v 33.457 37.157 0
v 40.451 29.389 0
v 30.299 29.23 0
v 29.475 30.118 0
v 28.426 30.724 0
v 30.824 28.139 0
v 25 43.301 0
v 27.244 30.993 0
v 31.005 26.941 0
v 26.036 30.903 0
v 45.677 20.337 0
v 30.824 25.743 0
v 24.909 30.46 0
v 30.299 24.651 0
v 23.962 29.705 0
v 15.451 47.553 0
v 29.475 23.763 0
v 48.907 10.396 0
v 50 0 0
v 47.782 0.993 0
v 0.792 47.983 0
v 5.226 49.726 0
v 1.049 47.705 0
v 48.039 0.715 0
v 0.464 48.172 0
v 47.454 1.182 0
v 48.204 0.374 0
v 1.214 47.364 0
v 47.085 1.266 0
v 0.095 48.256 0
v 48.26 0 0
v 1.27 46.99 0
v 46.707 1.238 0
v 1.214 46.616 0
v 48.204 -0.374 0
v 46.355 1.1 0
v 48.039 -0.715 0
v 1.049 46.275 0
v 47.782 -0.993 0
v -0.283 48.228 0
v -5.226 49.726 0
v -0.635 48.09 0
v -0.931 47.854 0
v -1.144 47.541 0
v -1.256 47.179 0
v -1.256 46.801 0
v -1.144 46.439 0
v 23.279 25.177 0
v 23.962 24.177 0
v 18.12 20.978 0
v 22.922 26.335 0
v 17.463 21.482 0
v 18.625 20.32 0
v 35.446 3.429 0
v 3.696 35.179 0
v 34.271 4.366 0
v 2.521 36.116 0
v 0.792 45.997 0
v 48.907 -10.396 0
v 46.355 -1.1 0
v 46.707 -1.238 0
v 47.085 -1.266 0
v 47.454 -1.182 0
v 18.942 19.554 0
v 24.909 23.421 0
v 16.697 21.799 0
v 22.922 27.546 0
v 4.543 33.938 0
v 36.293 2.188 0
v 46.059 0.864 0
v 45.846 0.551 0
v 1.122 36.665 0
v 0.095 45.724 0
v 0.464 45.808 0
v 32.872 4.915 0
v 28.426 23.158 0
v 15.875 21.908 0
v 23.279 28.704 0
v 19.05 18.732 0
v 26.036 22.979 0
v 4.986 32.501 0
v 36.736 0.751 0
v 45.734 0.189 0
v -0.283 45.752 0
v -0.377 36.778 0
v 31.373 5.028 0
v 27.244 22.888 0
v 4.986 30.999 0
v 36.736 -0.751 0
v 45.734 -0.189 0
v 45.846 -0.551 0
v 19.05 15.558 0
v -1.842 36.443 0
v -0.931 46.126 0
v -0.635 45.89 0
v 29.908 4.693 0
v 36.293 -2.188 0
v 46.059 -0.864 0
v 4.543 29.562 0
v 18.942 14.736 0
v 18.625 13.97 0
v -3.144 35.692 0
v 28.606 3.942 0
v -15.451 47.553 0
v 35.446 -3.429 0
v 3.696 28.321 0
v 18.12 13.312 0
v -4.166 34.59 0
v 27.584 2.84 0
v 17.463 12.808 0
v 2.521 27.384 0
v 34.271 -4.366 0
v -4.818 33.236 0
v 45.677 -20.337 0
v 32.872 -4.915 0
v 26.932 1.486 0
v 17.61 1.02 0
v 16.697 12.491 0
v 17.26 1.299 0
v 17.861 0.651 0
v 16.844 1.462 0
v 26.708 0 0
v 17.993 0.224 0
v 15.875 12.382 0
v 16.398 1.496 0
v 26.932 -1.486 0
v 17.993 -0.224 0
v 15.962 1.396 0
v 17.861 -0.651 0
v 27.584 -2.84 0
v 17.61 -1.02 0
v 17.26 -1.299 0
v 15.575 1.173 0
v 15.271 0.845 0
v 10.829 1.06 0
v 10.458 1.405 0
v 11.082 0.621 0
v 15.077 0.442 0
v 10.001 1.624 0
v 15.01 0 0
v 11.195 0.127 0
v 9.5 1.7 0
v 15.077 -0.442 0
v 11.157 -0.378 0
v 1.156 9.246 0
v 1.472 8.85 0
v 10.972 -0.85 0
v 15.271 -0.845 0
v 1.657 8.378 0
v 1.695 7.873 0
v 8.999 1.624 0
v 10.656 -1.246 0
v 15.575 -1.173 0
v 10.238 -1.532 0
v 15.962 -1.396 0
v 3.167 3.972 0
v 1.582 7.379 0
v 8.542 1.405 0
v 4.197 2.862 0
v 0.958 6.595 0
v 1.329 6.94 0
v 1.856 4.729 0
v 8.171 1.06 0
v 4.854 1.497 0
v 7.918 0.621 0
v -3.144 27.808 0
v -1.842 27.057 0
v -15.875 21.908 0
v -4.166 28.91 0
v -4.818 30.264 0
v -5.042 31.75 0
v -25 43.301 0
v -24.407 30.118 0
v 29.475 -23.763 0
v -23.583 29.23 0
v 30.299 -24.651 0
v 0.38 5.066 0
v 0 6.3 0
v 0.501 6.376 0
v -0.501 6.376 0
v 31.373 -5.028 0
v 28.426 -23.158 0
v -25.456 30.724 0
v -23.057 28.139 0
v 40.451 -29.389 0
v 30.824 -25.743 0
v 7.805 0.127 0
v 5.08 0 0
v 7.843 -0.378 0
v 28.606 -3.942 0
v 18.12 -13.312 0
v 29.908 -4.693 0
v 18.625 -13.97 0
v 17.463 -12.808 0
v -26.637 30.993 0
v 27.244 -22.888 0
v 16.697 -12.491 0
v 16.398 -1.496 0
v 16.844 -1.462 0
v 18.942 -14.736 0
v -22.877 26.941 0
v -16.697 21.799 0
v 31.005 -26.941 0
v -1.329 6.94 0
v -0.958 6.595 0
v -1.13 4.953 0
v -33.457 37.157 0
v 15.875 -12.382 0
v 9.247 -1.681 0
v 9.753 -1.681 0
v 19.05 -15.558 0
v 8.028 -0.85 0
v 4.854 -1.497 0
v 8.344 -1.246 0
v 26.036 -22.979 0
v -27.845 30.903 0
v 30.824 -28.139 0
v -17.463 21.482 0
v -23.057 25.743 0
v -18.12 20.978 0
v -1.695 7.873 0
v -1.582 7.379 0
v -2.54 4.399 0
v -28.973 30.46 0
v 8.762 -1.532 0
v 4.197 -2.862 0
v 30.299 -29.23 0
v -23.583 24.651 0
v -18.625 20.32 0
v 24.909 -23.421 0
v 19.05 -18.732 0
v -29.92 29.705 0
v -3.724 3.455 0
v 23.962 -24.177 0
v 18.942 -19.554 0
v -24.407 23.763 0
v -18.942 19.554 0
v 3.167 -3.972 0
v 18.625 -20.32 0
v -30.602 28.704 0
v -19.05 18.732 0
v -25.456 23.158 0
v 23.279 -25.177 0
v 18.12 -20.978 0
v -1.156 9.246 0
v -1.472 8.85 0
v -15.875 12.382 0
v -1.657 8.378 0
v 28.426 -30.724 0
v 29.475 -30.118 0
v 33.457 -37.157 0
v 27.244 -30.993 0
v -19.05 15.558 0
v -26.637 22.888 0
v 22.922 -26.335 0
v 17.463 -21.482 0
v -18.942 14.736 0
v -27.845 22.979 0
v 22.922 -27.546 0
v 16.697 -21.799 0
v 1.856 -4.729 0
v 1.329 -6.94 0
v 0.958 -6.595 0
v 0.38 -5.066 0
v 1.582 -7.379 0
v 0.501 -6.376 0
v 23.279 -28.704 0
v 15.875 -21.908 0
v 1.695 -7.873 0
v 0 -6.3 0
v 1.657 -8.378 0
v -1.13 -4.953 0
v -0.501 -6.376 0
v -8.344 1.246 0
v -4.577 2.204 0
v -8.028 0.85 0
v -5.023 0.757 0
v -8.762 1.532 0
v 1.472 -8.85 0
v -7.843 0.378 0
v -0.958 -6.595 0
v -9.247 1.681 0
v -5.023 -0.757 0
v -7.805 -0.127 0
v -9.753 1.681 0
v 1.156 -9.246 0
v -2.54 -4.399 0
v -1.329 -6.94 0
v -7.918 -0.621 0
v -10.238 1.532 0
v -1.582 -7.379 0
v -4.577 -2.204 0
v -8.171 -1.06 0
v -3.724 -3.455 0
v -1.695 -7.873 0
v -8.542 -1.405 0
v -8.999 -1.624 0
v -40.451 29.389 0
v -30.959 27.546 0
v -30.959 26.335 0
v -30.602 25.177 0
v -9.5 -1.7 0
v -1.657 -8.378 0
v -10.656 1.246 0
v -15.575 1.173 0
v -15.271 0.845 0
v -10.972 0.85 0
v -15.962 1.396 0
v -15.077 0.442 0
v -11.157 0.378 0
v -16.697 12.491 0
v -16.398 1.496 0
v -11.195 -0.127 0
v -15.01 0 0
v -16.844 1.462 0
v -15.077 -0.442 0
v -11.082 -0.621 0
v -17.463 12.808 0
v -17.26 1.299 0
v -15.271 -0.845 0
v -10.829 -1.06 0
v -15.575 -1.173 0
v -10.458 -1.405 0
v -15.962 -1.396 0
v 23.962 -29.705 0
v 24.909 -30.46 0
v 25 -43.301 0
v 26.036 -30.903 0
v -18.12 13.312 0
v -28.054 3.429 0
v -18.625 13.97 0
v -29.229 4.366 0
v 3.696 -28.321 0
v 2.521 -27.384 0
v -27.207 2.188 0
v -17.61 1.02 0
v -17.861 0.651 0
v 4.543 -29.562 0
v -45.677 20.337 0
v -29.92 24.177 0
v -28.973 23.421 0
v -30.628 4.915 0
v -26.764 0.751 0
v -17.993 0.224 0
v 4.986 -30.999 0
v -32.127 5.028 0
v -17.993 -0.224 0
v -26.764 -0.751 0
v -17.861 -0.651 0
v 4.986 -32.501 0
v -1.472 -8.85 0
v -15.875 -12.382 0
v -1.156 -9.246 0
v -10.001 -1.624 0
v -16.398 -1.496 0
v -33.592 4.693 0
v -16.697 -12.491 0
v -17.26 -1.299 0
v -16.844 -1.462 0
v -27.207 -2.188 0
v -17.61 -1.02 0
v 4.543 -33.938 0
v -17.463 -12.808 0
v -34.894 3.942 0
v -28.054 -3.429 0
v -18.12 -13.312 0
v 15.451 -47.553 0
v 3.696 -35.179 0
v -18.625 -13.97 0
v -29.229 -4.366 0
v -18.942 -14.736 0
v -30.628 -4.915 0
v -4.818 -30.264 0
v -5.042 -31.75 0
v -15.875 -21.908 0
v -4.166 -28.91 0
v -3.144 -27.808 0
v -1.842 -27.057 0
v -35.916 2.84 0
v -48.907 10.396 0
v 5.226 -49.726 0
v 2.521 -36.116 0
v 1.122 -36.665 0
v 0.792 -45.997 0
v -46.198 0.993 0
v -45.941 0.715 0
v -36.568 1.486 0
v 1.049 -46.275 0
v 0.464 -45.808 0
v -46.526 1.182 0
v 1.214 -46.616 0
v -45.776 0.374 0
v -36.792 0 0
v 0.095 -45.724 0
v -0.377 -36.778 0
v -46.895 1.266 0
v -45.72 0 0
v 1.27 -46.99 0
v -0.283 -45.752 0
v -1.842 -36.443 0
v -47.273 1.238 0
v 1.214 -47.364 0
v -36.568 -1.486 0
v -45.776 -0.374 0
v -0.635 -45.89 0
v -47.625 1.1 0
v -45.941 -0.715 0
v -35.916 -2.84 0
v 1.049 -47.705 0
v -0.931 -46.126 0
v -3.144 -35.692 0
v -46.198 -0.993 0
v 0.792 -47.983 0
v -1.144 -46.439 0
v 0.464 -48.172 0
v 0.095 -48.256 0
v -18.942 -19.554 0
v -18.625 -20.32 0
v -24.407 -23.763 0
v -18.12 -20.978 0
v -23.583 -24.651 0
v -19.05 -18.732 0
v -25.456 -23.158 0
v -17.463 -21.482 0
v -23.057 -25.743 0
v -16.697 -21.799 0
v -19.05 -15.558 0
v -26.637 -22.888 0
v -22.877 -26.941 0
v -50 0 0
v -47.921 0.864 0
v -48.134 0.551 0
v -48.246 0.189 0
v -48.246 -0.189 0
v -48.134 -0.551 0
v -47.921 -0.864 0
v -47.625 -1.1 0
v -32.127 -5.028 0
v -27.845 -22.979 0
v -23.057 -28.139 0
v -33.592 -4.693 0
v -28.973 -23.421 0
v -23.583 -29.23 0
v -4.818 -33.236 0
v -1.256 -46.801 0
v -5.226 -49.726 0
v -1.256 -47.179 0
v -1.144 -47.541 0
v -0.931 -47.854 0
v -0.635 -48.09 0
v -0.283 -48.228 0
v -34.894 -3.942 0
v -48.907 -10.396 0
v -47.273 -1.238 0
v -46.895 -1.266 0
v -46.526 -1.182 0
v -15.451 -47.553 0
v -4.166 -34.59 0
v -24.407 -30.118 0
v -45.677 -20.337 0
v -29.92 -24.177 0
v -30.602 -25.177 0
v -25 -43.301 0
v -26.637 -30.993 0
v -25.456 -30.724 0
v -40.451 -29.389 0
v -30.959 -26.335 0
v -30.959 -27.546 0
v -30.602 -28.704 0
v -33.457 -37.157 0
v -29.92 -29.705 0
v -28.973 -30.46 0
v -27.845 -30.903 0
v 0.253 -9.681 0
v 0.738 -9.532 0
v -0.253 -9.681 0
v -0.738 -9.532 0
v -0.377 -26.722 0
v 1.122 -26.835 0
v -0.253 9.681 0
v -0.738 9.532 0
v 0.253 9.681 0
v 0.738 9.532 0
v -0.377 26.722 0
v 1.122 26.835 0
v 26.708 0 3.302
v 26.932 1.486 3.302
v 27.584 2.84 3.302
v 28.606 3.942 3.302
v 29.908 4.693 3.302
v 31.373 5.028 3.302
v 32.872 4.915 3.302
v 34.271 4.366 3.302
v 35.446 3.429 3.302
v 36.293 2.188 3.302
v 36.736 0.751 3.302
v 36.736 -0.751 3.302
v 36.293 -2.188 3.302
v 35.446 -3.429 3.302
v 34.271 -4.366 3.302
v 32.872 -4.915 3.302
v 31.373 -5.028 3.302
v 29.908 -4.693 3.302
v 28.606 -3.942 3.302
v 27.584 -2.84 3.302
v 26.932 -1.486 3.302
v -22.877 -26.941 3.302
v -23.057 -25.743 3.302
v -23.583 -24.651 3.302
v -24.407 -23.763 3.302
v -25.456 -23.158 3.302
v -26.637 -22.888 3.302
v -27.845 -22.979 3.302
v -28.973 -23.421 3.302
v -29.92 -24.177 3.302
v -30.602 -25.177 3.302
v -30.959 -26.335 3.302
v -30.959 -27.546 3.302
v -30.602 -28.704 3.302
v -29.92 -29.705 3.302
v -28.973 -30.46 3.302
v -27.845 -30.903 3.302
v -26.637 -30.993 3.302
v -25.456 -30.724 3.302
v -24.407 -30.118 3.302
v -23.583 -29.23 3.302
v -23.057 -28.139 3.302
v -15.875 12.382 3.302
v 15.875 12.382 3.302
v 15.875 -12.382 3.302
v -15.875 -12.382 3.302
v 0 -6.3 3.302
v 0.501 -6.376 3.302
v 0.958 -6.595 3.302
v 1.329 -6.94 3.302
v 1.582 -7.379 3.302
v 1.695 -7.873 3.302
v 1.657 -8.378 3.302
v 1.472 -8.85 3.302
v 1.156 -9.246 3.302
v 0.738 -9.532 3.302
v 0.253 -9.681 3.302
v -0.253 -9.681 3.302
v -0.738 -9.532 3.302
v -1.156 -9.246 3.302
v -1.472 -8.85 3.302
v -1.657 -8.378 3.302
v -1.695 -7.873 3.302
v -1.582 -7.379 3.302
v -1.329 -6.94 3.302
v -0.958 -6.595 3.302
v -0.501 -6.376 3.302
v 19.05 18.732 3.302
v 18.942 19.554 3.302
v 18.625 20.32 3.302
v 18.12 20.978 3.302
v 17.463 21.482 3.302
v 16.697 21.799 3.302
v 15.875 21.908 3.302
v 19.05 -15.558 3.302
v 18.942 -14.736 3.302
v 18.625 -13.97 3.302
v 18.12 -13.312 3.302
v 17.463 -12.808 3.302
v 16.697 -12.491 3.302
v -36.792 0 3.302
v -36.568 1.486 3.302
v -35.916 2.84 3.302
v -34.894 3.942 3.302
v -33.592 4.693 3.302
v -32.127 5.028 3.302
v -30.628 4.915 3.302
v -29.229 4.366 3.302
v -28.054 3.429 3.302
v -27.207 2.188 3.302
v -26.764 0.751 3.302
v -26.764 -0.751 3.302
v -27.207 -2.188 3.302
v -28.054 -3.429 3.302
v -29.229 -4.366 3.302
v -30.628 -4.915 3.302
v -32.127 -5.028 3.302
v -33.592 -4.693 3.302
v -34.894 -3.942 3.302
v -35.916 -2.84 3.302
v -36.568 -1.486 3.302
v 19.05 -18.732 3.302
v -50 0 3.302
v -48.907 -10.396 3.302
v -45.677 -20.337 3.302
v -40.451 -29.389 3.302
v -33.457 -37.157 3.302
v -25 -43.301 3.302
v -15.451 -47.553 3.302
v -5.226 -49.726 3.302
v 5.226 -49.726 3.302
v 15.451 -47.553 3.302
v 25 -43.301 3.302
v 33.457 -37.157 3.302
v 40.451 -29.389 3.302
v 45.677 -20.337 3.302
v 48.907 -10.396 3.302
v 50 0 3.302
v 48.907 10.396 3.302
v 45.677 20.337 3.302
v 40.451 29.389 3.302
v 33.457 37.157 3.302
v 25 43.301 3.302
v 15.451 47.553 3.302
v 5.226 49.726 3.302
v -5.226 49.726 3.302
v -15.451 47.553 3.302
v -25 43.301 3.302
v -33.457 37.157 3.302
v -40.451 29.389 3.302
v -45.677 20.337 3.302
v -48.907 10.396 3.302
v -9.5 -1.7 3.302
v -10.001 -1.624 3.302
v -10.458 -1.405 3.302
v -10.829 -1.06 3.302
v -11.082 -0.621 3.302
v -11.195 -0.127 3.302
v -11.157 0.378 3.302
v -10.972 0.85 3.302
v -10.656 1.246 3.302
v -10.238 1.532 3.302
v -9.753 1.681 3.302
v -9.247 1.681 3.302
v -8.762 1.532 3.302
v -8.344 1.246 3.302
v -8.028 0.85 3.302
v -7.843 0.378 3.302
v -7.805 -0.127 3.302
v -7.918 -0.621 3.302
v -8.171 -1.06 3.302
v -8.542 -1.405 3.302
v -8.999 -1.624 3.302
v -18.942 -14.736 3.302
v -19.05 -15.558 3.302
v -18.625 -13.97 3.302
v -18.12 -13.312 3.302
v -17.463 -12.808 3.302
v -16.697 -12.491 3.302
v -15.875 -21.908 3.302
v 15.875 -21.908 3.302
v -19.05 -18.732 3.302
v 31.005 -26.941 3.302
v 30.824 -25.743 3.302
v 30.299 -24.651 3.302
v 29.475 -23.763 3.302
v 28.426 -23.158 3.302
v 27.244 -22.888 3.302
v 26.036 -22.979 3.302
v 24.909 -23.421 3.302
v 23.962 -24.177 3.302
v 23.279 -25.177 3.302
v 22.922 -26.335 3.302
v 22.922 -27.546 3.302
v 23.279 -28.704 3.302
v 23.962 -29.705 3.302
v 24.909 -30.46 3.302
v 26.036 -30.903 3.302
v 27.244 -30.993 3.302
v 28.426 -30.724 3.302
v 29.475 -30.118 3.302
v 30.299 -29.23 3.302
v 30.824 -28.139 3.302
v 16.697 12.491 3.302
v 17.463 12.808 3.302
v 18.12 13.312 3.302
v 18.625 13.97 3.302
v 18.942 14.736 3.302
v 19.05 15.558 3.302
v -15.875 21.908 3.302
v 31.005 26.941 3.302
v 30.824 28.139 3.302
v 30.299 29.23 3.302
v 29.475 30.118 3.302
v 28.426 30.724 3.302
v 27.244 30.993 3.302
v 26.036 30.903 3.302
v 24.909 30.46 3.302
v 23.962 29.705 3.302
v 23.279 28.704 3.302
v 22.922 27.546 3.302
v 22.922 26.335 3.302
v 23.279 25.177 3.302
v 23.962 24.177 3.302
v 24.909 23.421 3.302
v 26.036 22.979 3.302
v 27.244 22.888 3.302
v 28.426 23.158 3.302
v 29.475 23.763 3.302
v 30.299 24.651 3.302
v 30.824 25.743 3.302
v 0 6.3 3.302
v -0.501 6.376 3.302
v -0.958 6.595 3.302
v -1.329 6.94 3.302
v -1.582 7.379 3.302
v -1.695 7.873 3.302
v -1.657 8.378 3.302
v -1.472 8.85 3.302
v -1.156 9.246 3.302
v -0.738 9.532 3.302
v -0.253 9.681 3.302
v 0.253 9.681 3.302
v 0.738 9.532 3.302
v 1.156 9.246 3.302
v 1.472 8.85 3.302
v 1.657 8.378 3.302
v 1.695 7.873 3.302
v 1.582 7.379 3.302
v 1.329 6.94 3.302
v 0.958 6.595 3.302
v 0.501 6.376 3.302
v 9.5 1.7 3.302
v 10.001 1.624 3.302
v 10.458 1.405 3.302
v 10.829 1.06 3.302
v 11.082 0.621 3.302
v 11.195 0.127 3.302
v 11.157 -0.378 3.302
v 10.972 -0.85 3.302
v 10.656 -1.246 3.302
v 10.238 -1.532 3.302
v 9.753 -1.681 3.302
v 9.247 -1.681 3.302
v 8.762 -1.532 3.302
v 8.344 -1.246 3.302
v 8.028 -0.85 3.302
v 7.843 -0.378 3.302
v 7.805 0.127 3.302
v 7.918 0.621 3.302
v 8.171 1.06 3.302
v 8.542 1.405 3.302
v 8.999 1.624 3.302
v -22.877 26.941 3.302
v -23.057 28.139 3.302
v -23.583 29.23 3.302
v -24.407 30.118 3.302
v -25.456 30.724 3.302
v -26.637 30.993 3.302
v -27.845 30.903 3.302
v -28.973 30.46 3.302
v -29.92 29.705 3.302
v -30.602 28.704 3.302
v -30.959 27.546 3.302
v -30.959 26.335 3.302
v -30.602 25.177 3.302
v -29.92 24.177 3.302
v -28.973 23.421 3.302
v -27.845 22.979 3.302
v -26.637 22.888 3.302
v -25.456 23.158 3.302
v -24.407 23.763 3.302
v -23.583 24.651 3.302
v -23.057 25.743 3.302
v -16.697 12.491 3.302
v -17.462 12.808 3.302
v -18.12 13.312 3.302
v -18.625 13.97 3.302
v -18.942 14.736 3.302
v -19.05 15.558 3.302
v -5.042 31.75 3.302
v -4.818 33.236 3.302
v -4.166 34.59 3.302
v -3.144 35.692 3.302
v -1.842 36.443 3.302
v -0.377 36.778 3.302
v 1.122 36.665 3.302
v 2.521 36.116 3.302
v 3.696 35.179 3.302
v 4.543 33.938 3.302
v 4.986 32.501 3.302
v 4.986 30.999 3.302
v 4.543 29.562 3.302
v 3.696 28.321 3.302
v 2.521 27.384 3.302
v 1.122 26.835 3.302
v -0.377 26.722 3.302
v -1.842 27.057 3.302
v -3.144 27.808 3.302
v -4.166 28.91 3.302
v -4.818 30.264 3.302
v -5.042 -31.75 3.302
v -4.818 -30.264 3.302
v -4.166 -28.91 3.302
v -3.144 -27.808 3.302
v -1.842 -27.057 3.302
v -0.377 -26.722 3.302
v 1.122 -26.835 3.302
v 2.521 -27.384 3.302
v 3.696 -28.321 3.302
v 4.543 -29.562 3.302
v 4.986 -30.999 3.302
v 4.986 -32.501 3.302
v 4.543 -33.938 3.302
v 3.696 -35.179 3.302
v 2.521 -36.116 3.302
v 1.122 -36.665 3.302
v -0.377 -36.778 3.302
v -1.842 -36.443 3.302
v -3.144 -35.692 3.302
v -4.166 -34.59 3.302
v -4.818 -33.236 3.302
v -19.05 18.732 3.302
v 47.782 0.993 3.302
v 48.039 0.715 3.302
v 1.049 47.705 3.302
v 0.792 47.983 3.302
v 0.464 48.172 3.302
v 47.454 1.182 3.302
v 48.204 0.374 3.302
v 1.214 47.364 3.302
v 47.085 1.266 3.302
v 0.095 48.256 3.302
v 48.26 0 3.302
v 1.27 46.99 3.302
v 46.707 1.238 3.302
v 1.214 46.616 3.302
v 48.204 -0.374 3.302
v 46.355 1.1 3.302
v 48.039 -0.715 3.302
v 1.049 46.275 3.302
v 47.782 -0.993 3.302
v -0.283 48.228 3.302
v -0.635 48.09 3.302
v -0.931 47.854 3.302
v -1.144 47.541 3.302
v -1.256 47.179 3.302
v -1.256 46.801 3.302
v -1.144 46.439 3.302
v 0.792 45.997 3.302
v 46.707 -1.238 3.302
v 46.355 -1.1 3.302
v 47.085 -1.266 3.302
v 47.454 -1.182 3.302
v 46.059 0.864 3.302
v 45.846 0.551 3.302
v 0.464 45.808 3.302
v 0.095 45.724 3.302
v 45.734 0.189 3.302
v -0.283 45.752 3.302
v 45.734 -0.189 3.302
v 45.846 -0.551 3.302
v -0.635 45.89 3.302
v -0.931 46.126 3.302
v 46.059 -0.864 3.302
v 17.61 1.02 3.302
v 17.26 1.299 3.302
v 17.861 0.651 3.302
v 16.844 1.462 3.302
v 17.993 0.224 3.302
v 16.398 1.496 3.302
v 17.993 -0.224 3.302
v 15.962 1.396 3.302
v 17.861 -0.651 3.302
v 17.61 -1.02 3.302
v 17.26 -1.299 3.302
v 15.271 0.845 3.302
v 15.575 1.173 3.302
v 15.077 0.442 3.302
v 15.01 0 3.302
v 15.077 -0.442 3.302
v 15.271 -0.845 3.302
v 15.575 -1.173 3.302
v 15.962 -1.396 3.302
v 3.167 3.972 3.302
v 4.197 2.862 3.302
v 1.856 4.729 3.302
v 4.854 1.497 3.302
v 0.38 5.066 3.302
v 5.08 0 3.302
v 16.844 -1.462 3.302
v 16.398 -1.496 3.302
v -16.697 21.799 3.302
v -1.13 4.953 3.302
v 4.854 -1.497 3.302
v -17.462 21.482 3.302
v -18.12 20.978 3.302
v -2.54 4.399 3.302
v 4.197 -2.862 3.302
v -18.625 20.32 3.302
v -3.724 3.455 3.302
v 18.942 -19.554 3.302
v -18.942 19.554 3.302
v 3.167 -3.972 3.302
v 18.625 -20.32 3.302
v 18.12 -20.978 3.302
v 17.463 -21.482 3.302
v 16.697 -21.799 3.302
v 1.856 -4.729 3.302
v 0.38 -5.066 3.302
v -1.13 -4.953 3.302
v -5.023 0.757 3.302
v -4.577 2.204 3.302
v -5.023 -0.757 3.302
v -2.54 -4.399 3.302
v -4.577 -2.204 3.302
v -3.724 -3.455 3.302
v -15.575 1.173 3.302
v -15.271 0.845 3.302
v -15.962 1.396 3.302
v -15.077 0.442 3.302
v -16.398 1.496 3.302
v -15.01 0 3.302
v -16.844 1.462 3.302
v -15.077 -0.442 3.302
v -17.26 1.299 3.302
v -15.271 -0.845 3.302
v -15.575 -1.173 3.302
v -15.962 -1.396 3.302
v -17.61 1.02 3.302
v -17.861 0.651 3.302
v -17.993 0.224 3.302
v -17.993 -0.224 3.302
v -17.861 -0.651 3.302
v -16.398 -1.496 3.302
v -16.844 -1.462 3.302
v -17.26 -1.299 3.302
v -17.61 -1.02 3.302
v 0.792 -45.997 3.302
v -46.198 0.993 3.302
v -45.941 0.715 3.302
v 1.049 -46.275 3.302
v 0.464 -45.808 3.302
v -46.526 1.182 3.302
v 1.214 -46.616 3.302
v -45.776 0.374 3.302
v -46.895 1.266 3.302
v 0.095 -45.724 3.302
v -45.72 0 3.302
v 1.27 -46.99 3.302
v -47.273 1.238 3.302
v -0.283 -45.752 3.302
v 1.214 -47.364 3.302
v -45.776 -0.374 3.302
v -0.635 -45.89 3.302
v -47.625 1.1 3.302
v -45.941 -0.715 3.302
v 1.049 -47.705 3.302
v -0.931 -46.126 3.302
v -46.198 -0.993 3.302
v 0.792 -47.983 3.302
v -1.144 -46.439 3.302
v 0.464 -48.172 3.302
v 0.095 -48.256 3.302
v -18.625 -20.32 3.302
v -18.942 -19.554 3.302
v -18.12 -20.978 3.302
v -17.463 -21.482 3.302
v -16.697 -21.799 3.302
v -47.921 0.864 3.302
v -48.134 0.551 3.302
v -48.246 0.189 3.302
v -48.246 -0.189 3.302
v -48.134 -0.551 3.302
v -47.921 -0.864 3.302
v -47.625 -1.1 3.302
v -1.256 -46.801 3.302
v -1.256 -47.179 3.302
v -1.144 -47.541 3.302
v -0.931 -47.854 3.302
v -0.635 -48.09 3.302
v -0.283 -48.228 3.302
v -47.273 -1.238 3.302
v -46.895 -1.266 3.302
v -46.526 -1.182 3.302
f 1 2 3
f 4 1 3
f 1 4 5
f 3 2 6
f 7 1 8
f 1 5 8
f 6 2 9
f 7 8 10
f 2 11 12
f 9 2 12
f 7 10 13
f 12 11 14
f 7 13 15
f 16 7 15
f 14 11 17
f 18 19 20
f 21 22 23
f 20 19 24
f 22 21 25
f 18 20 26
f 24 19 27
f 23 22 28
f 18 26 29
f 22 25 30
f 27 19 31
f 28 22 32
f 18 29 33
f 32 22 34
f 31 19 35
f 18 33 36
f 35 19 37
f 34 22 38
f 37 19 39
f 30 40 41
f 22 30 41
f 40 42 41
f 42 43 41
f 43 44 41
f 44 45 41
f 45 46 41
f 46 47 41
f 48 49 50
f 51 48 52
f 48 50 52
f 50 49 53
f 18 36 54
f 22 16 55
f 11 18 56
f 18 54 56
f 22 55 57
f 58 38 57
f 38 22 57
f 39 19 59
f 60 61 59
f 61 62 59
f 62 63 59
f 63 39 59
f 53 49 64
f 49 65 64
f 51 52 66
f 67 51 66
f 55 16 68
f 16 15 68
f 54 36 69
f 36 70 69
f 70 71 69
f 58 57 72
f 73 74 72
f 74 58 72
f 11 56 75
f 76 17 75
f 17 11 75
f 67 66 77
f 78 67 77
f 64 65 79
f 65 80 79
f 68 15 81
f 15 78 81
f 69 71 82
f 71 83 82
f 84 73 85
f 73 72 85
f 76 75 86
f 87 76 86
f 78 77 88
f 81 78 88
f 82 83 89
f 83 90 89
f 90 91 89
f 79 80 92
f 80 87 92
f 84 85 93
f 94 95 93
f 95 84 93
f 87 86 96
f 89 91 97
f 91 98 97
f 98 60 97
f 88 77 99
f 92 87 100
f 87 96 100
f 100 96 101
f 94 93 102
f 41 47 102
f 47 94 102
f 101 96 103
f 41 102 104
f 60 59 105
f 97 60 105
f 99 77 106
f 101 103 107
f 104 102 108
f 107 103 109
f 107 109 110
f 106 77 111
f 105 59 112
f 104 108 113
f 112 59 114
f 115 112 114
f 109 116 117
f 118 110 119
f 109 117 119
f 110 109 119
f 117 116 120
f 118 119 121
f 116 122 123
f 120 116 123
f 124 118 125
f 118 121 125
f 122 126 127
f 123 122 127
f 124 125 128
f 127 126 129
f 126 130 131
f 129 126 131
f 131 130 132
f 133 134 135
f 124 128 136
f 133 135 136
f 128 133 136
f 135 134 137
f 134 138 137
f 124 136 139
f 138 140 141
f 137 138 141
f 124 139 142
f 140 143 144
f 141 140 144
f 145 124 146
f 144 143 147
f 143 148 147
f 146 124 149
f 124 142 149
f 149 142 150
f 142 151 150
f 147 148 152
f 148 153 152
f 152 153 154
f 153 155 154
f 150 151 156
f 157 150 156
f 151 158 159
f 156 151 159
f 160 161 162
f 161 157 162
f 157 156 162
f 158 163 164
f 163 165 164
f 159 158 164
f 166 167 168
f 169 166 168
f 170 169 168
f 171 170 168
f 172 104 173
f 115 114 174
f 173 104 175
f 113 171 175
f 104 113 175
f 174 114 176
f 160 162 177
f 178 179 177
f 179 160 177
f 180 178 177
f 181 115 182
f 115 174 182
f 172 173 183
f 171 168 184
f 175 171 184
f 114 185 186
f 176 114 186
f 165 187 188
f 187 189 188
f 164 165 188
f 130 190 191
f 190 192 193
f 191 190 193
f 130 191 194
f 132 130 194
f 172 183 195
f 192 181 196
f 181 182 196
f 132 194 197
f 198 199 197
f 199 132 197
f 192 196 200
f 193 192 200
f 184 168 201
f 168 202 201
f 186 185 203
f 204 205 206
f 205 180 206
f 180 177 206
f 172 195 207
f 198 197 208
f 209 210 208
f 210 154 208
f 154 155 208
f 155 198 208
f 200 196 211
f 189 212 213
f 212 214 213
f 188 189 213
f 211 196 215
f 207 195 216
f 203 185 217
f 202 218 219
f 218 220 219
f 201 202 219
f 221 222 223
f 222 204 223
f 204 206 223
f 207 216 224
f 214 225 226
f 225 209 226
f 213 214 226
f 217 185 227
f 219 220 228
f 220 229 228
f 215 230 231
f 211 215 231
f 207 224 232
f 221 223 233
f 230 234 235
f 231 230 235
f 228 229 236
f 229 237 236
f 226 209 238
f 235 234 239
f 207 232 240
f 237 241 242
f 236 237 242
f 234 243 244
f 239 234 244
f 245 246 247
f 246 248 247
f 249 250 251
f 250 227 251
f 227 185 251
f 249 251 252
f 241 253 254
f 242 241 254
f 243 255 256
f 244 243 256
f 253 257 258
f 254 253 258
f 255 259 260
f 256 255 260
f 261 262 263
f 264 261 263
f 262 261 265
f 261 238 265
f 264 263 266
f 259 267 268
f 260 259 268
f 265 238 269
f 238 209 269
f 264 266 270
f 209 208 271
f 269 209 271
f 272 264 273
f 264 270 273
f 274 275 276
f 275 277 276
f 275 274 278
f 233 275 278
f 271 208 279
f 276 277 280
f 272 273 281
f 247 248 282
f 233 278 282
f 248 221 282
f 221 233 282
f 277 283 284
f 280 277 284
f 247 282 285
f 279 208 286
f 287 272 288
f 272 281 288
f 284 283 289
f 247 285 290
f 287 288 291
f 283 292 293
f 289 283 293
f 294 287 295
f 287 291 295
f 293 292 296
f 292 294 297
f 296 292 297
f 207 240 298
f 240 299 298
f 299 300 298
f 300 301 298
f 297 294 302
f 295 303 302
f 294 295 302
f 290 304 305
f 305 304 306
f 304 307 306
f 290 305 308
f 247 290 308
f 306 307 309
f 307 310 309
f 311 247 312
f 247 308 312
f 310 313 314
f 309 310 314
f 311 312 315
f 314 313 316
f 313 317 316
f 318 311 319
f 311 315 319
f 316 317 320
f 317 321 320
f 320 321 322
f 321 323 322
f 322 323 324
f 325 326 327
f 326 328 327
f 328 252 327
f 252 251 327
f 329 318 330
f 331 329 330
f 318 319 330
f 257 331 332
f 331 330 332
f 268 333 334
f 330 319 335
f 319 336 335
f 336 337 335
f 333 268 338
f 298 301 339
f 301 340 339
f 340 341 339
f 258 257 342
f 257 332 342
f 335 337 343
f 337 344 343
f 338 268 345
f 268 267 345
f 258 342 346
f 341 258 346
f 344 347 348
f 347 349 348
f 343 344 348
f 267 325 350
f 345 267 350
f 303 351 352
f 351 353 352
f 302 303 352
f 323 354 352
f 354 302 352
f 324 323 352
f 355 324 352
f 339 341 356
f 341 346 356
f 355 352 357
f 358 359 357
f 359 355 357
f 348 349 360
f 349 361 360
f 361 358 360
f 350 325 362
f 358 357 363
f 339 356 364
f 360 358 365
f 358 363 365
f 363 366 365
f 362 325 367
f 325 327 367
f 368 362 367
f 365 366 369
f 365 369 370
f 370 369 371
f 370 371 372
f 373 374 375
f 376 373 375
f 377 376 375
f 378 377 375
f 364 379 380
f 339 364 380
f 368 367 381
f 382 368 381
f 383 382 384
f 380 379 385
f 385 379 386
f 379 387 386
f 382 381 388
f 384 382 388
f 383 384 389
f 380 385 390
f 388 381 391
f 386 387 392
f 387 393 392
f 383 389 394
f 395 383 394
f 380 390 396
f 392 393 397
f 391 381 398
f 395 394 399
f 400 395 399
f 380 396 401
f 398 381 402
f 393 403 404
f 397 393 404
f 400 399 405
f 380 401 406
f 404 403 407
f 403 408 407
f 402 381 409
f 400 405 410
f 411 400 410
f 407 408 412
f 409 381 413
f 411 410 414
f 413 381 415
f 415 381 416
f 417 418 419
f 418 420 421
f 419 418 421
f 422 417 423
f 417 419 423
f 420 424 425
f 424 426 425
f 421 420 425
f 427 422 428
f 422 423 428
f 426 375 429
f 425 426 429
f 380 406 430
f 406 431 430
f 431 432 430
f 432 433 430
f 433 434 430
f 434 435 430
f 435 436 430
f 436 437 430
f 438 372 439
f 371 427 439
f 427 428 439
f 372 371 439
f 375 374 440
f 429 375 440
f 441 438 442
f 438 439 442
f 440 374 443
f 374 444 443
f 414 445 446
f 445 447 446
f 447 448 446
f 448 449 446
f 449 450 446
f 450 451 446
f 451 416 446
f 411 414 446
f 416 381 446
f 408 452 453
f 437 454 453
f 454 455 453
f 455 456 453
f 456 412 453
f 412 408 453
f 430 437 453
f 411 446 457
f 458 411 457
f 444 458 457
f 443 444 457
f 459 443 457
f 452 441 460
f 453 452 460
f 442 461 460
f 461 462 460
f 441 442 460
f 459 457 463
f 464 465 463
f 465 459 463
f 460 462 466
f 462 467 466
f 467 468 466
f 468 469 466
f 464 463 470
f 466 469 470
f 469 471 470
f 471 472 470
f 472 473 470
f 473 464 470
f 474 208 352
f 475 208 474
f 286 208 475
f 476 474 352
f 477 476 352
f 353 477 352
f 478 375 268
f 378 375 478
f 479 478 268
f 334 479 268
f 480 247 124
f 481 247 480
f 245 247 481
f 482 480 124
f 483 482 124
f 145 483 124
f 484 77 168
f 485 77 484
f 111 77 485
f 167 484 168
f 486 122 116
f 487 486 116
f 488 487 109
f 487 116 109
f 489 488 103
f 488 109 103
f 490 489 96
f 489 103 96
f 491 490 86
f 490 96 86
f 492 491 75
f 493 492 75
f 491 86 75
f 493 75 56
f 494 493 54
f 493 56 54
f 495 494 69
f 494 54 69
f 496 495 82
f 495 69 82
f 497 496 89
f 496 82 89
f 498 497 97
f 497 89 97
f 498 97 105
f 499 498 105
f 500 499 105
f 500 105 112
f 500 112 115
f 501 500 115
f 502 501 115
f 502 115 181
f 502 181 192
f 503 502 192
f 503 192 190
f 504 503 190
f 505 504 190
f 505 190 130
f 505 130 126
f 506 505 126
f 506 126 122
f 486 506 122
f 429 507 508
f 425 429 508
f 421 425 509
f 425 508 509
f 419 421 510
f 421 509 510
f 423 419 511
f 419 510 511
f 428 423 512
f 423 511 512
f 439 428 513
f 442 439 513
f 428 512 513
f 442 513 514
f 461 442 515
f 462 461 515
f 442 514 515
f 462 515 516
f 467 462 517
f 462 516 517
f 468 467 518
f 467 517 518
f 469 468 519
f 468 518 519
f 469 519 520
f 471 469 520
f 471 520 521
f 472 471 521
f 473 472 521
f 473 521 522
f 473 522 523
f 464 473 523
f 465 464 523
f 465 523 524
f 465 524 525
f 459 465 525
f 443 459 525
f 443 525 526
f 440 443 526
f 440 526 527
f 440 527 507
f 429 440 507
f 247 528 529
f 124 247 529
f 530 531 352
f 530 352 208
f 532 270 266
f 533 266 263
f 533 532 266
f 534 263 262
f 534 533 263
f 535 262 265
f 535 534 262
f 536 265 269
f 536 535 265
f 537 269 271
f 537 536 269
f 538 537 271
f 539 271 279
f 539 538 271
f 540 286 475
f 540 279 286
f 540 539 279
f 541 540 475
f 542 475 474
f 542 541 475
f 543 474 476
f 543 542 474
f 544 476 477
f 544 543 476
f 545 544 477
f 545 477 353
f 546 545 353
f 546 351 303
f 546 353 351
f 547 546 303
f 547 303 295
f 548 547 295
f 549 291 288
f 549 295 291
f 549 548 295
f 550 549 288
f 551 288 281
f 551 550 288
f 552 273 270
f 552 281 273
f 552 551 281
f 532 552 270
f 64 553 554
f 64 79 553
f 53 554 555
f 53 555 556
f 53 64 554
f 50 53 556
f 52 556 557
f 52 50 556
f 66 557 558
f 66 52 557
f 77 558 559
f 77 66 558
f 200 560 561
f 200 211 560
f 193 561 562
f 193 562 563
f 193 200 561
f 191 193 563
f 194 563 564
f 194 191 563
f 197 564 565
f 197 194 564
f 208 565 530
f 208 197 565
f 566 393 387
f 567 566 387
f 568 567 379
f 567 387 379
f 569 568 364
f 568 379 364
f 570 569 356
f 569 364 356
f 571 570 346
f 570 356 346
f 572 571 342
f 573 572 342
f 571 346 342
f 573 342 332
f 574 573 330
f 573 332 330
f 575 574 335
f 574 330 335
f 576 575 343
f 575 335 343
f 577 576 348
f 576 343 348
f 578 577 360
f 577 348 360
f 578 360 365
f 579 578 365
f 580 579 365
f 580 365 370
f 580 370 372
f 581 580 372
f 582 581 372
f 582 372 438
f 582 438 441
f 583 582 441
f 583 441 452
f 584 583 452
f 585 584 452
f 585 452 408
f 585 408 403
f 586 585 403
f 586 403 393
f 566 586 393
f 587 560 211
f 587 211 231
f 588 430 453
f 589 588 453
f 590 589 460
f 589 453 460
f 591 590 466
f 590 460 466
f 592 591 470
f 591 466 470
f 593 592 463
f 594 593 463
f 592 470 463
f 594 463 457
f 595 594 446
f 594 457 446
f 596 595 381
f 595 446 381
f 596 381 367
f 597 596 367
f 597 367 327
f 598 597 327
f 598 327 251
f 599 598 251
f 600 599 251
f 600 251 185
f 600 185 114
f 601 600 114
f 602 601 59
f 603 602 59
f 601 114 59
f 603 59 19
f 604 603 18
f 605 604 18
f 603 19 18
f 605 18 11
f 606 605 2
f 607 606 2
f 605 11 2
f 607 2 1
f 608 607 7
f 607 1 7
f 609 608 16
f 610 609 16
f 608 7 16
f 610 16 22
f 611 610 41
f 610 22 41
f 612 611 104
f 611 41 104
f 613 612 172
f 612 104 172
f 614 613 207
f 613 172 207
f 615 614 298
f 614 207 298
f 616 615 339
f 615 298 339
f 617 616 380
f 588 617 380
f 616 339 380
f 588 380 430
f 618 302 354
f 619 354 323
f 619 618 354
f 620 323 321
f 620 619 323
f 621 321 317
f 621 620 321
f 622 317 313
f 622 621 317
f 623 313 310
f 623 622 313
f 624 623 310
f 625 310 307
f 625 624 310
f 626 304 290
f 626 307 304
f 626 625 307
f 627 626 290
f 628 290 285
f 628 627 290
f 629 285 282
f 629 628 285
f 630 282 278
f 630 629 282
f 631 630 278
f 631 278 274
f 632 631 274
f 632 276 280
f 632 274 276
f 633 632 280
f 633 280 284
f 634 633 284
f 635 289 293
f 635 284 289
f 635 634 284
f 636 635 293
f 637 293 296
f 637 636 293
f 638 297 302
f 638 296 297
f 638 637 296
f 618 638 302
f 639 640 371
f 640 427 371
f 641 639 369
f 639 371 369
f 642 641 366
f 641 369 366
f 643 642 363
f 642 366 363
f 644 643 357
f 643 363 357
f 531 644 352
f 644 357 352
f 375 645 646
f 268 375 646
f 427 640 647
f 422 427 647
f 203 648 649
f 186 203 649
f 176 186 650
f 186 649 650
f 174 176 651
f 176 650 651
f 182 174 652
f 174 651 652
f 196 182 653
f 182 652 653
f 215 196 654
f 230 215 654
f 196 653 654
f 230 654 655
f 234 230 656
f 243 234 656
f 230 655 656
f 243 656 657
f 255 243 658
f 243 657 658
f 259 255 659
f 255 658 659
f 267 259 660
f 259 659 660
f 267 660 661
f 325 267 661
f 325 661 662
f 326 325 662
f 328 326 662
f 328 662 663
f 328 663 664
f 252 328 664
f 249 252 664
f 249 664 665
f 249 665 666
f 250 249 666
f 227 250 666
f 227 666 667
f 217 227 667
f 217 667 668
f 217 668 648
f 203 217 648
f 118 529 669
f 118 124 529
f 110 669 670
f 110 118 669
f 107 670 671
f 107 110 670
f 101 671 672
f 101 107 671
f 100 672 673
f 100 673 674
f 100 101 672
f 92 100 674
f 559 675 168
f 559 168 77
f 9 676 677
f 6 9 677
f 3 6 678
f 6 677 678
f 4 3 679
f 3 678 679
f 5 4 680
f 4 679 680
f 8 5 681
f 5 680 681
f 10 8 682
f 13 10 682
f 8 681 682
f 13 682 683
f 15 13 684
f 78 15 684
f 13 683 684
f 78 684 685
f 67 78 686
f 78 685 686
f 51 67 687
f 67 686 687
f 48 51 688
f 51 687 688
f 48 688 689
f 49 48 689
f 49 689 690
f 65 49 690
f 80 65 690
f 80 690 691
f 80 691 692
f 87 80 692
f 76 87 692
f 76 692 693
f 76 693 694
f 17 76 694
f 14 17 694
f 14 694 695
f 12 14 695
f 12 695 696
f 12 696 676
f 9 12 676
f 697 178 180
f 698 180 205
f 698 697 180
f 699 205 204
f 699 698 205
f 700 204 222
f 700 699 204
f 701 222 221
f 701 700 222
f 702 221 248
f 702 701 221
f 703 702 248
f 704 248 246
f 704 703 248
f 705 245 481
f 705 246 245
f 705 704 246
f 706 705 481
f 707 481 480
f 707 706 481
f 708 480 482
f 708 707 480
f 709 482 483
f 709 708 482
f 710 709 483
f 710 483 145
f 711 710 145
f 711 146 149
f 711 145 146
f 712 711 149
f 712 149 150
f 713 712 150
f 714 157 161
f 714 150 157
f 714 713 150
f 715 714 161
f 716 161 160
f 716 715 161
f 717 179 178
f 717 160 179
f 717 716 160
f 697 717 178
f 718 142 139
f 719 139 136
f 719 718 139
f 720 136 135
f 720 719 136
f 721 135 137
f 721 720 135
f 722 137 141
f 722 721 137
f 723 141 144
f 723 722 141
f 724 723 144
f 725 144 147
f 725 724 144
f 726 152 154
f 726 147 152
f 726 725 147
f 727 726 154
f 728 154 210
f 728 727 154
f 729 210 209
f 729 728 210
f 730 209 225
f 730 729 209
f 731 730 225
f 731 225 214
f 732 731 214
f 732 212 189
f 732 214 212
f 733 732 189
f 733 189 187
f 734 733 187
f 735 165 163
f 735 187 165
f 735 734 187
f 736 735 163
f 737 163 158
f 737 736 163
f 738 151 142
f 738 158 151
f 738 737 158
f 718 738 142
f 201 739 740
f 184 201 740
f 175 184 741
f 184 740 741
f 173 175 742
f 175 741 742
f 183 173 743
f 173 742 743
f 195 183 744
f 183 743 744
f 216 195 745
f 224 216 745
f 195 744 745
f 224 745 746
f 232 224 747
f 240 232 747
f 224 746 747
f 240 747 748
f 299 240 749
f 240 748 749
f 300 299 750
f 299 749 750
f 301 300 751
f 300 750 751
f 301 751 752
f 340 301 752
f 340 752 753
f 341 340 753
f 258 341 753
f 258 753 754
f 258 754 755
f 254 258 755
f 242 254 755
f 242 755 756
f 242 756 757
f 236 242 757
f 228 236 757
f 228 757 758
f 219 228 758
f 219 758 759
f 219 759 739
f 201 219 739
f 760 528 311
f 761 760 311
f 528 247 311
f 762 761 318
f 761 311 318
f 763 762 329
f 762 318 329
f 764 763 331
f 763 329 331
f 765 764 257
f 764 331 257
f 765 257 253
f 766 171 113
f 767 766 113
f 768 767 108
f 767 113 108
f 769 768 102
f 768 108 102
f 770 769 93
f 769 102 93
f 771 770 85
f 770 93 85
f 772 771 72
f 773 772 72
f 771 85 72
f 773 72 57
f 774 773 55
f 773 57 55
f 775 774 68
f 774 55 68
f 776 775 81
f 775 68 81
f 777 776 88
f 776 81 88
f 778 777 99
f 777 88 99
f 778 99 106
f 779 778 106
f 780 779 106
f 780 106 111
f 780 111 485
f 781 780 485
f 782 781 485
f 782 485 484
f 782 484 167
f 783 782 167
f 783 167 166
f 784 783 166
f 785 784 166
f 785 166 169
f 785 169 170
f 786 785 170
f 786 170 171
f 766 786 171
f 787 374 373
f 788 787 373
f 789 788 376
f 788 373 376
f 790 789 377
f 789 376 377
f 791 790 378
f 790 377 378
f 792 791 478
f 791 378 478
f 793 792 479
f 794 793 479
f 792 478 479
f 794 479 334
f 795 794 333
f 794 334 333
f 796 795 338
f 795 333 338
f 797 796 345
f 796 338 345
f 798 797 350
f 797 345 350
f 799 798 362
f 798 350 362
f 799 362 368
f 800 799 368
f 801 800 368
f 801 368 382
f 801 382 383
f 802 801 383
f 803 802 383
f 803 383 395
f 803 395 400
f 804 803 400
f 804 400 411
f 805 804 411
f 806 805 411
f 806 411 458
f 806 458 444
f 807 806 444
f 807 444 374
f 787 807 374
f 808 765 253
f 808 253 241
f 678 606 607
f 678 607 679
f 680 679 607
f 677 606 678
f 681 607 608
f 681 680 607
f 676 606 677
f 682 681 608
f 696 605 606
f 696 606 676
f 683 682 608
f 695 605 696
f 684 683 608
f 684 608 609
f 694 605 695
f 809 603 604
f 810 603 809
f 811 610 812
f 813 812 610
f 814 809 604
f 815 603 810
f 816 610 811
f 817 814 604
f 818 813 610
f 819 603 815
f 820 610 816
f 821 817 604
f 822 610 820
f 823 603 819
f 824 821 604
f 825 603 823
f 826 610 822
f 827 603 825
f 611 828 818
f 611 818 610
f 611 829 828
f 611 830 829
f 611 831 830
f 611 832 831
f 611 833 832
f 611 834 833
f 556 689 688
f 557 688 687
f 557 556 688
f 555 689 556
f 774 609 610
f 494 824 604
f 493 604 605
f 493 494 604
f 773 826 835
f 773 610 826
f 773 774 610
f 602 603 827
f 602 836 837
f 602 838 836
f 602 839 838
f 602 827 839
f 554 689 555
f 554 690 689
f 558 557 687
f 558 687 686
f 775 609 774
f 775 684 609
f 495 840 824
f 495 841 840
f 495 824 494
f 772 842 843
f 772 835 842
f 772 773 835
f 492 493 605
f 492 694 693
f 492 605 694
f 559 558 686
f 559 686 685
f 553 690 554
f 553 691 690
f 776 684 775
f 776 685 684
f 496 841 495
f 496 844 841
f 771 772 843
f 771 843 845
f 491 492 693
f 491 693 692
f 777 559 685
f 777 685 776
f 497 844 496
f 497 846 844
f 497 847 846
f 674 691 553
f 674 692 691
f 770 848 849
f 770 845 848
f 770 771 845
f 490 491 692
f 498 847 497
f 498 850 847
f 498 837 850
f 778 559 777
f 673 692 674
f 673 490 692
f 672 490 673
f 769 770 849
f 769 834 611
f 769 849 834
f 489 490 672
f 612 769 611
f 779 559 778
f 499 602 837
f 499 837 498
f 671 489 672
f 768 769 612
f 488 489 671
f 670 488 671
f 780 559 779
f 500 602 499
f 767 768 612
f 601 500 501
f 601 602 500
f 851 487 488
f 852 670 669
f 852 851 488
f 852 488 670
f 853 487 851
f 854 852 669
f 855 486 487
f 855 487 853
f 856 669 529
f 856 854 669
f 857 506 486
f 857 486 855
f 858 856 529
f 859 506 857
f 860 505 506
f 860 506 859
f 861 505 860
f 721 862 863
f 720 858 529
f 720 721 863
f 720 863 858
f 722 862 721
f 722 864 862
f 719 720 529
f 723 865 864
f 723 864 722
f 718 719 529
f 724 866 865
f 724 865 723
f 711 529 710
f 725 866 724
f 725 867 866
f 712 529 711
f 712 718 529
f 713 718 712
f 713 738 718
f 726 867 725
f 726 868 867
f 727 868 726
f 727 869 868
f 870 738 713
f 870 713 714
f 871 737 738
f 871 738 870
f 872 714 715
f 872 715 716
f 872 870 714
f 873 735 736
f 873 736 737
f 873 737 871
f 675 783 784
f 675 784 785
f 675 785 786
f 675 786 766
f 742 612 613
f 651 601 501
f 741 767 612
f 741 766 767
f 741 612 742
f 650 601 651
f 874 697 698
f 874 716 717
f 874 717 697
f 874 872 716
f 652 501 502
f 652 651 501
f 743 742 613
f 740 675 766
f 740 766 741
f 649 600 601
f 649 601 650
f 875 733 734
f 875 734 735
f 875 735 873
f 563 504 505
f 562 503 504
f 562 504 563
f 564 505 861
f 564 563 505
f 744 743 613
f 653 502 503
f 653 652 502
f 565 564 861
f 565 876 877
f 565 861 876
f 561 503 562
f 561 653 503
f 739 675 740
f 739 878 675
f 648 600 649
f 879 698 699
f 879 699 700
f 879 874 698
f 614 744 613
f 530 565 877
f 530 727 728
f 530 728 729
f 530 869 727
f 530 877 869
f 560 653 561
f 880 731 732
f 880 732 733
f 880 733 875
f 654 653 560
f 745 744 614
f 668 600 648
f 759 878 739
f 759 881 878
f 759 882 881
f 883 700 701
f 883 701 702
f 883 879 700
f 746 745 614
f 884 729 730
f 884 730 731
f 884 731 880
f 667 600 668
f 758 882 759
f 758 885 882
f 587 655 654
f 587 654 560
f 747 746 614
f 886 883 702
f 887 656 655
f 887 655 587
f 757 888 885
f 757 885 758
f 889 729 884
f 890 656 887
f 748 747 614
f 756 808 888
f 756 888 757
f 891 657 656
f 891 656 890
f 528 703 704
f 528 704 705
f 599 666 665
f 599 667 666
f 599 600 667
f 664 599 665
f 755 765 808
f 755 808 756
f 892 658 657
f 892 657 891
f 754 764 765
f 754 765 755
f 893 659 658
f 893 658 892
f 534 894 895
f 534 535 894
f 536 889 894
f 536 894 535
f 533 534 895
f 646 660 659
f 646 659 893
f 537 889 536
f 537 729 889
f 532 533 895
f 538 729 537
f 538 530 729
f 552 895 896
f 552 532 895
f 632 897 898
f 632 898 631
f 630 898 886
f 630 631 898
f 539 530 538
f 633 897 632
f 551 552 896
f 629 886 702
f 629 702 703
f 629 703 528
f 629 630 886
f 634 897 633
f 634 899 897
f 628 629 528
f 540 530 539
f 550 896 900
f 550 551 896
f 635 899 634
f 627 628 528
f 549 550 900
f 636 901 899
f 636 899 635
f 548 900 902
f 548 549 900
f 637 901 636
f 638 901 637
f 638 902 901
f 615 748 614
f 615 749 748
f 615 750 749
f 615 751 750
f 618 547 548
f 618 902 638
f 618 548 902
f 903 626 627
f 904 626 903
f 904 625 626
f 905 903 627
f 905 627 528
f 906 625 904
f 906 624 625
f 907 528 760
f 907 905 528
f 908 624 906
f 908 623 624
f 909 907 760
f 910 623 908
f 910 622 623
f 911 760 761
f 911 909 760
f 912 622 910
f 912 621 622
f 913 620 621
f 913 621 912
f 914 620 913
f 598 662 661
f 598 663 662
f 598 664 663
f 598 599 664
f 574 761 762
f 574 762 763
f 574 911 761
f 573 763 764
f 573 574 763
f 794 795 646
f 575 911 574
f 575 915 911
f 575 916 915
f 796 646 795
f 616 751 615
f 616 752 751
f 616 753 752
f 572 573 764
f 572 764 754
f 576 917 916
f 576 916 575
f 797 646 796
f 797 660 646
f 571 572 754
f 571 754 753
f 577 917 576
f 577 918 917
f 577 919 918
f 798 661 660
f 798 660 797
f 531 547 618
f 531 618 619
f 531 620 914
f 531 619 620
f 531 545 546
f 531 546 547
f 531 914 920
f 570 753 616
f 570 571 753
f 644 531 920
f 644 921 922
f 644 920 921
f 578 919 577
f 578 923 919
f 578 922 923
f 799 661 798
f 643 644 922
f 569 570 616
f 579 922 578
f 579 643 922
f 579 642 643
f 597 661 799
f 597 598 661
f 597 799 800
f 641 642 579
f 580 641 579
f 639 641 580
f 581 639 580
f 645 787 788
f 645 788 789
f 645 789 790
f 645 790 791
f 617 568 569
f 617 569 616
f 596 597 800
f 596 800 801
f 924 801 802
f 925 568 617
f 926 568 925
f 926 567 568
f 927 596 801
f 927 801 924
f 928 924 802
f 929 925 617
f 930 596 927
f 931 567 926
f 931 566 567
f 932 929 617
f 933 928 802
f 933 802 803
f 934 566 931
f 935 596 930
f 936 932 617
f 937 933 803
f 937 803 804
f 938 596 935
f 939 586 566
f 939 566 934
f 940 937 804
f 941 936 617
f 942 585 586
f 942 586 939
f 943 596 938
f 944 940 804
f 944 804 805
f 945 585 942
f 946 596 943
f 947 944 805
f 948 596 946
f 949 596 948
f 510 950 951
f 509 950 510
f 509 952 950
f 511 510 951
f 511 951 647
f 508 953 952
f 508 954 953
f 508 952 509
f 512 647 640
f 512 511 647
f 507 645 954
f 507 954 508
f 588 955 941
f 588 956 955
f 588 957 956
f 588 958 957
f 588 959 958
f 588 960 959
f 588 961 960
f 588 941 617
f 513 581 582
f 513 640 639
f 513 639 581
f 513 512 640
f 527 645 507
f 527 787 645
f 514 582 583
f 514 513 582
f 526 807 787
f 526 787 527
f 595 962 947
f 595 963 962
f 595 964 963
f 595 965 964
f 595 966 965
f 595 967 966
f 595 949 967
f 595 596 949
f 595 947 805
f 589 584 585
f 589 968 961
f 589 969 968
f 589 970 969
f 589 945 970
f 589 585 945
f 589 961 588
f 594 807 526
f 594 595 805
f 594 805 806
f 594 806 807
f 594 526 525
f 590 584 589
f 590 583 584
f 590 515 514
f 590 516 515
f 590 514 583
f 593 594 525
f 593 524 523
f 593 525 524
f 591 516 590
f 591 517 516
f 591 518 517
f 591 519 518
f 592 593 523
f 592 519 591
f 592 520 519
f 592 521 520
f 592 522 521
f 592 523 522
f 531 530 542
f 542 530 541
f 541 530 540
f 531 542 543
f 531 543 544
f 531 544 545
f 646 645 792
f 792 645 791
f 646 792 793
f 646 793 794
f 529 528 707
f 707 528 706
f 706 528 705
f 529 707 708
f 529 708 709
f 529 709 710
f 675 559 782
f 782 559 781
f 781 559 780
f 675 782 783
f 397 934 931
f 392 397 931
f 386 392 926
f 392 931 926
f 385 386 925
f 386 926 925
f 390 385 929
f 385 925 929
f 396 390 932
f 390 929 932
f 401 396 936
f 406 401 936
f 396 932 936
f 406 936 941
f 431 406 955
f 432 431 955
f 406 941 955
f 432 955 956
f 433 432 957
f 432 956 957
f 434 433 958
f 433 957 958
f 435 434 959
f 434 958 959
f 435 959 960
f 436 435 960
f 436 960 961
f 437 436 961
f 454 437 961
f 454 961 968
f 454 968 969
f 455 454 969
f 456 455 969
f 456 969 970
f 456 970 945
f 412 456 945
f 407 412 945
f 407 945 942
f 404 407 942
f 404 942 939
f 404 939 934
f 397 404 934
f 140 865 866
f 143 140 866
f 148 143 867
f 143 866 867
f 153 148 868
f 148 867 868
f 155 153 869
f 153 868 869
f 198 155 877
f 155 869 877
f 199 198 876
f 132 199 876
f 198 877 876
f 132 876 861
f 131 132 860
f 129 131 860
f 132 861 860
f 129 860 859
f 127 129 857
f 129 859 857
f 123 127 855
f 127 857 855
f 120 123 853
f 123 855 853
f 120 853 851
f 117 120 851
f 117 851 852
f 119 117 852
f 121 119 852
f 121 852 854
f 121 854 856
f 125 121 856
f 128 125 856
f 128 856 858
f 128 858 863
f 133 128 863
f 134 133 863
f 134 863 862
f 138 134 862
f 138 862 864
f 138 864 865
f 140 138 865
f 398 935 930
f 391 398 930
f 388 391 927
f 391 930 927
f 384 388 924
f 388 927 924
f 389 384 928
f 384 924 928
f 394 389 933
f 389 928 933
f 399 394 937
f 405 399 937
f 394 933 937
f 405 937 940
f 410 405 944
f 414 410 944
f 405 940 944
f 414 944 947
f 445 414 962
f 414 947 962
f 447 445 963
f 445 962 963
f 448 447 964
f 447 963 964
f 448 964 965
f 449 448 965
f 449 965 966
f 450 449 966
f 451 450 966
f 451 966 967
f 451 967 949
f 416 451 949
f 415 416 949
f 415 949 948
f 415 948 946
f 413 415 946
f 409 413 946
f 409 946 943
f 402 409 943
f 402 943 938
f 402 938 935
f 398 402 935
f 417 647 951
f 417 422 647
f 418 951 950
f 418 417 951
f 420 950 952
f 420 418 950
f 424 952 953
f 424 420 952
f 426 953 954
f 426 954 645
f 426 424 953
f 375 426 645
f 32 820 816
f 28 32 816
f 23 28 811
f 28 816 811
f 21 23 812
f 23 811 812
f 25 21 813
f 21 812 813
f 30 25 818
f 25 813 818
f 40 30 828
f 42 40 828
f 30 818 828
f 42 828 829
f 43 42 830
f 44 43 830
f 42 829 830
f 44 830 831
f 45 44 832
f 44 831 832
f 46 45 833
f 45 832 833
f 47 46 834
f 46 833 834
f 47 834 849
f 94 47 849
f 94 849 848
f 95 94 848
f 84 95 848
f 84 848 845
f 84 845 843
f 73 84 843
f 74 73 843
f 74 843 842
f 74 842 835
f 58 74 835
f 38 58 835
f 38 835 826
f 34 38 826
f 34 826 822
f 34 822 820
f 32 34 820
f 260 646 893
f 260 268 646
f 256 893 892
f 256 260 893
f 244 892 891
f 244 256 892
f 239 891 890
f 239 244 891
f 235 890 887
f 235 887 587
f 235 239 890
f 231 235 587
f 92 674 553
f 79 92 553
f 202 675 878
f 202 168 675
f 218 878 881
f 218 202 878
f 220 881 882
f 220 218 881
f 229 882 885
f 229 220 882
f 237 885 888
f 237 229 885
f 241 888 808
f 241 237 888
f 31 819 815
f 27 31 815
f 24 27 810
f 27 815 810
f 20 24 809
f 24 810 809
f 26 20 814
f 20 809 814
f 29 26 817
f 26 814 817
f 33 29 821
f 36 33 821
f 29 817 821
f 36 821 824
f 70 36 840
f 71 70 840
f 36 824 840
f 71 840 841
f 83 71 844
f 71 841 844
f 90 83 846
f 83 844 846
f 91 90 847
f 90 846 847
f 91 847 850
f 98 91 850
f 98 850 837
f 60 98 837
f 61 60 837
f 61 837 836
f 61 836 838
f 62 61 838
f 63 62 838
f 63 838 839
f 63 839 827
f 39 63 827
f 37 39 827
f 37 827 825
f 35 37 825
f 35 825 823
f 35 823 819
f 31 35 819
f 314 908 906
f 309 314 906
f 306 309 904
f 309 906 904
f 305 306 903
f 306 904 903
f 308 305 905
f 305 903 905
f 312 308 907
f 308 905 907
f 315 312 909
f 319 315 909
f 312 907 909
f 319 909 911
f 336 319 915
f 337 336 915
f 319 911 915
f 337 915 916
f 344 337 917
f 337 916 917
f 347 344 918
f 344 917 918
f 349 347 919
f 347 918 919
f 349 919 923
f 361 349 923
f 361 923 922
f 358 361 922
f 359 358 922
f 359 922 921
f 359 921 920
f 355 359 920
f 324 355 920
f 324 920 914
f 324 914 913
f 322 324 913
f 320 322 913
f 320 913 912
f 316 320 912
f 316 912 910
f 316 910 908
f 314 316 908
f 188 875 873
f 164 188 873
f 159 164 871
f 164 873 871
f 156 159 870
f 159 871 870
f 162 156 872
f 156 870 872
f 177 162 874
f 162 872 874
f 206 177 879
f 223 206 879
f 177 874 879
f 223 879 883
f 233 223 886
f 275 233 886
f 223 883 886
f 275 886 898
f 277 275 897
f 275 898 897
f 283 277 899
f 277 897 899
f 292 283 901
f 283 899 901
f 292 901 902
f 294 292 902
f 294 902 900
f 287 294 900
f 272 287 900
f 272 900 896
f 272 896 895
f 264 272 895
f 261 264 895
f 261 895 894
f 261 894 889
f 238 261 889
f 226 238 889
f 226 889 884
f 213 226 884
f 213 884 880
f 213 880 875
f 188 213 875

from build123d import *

# Parameters (mm, degrees)
SKETCH_1_R                    = 50
EXTRUDE_1_DEPTH               = 3.302
SKETCH_2_R                    = 4.064
CUT_EXTRUDE_1_DEPTH           = 71.787733429
SKETCH_4_R                    = 5.08
CUT_EXTRUDE_3_DEPTH           = 71.787733429
SKETCH_7_R                    = 1.27
CUT_EXTRUDE_6_DEPTH           = 71.787733429
M3_CLEARANCE_HOLE1_AT_2_COUNT = 2
M3_CLEARANCE_HOLE1_AT_2_PITCH = 12.419742348
F_3_8_CLEARANCE_HOLE1_D       = 10.0838
SKETCH11_R                    = 1.5
CUT_EXTRUDE5_DEPTH            = 71.787733429
CIRPATTERN1_COUNT             = 2
CIRPATTERN2_COUNT             = 2
SKETCH12_W                    = 38.1
SKETCH12_H                    = 9.525
CUT_EXTRUDE6_DEPTH            = 71.787733429
FILLET1_R                     = 3.175
FILLET1_OF_MIRROR1_R          = 3.175


with BuildPart() as part:
    # 草图1 → 凸台-拉伸1 (new body)
    with BuildSketch(Plane.XY):
        with Locations(Location((0, 0, 0), (0, 0, 180))):
            Circle(SKETCH_1_R)
    extrude(amount=EXTRUDE_1_DEPTH)

    # 草图2 → 切除-拉伸1 (cut, through all)
    with BuildSketch(Plane.XY.offset(3.302)):
        with Locations((-26.940768363, 26.940768363)):
            Circle(SKETCH_2_R)
        with Locations((-26.940768363, -26.940768363)):
            Circle(SKETCH_2_R)
        with Locations((26.940768363, -26.940768363)):
            Circle(SKETCH_2_R)
        with Locations((26.940768363, 26.940768363)):
            Circle(SKETCH_2_R)
    extrude(amount=-CUT_EXTRUDE_1_DEPTH, mode=Mode.SUBTRACT)

    # 草图4 → 切除-拉伸3 (cut, through all)
    with BuildSketch(Plane.XY.offset(3.302)):
        Circle(SKETCH_4_R)
    extrude(amount=-CUT_EXTRUDE_3_DEPTH, mode=Mode.SUBTRACT)

    # 草图7 → 切除-拉伸6 (cut, through all)
    with BuildSketch(Plane.XY.offset(3.302)):
        with Locations((0, 46.99)):
            Circle(SKETCH_7_R)
        with Locations((46.99, 0)):
            Circle(SKETCH_7_R)
        with Locations((0, -46.99)):
            Circle(SKETCH_7_R)
        with Locations((-46.99, 0)):
            Circle(SKETCH_7_R)
    extrude(amount=-CUT_EXTRUDE_6_DEPTH, mode=Mode.SUBTRACT)

    # Sketch2 → M3 Clearance Hole1 (revolve, cut)
    with BuildSketch(Plane(origin=(0, 8, 3.302), x_dir=(0, -1, 0), z_dir=(1, 0, 0))):
        Polygon((0, 0), (0, 26.421463052), (1.7, 25.4), (1.7, 0), align=None)
    m3_clearance_hole1 = revolve(axis=Axis((0, 8, 9.652), (0, 0, -1)), mode=Mode.SUBTRACT)

    # M3 Clearance Hole1 at 2: M3 Clearance Hole1 ×2
    with Locations(*[Vector(-0.7649111981170567, -0.6441357457827728, 0) * (i * M3_CLEARANCE_HOLE1_AT_2_PITCH) for i in range(1, M3_CLEARANCE_HOLE1_AT_2_COUNT)]):
        add(m3_clearance_hole1, mode=Mode.SUBTRACT)

    # 3/8 Clearance Hole1 (through all)
    with Locations(Plane.XY.offset(3.302)):
        with Locations((0, 31.75), (-31.75, 0), (31.75, 0), (0, -31.75)):
            Hole(F_3_8_CLEARANCE_HOLE1_D / 2)

    # Sketch11 → Cut-Extrude5 (cut, through all)
    with BuildSketch(Plane.XY.offset(3.302)):
        with Locations((-16.51, 0)):
            Circle(SKETCH11_R)
    cut_extrude5 = extrude(amount=-CUT_EXTRUDE5_DEPTH, mode=Mode.SUBTRACT)

    # CirPattern1: Cut-Extrude5 ×2 about axis
    cirpattern1_axis = Axis((0, 0, 0), (0, 0, 1))
    for i in range(1, CIRPATTERN1_COUNT):
        add(cut_extrude5.rotate(cirpattern1_axis, i * 360 / CIRPATTERN1_COUNT), mode=Mode.SUBTRACT)

    # CirPattern2: M3 Clearance Hole1 ×2 about axis
    cirpattern2_axis = Axis((0, 0, 0), (0, 0, 1))
    for i in range(1, CIRPATTERN2_COUNT):
        add(m3_clearance_hole1.rotate(cirpattern2_axis, i * 360 / CIRPATTERN2_COUNT), mode=Mode.SUBTRACT)

    # CirPattern2 copy 1 sketch → CirPattern2 copy 1 (revolve, cut)
    with BuildSketch(Plane(origin=(9.5, 0, 3.302), x_dir=(0, 1, 0), z_dir=(-1, 0, 0))):
        Polygon((0, 0), (0, 26.421463052), (1.7, 25.4), (1.7, 0), align=None)
    revolve(axis=Axis((9.5, 0, 9.652), (0, 0, -1)), mode=Mode.SUBTRACT)

    # Sketch12 → Cut-Extrude6 (cut, through all)
    with BuildSketch(Plane.XY.offset(3.302)):
        with Locations((0, 17.145)):
            Rectangle(SKETCH12_W, SKETCH12_H)
    cut_extrude6 = extrude(amount=-CUT_EXTRUDE6_DEPTH, mode=Mode.SUBTRACT)

    # Fillet1
    fillet1_edges = [part.edges().sort_by_distance(p)[0] for p in [
        (19.05, 21.9075, 1.651),
        (19.05, 12.3825, 1.651),
        (-19.05, 12.3825, 1.651),
        (-19.05, 21.9075, 1.651),
    ]]
    fillet(fillet1_edges, radius=FILLET1_R)

    # Mirror1: Cut-Extrude6 across plane
    add(cut_extrude6.mirror(Plane.ZX), mode=Mode.SUBTRACT)

    # Fillet1 of Mirror1
    fillet1_of_mirror1_edges = [part.edges().sort_by_distance(p)[0] for p in [
        (19.05, -21.9075, 1.651),
        (19.05, -12.3825, 1.651),
        (-19.05, -12.3825, 1.651),
        (-19.05, -21.9075, 1.651),
    ]]
    fillet(fillet1_of_mirror1_edges, radius=FILLET1_OF_MIRROR1_R)


solid = part.part
